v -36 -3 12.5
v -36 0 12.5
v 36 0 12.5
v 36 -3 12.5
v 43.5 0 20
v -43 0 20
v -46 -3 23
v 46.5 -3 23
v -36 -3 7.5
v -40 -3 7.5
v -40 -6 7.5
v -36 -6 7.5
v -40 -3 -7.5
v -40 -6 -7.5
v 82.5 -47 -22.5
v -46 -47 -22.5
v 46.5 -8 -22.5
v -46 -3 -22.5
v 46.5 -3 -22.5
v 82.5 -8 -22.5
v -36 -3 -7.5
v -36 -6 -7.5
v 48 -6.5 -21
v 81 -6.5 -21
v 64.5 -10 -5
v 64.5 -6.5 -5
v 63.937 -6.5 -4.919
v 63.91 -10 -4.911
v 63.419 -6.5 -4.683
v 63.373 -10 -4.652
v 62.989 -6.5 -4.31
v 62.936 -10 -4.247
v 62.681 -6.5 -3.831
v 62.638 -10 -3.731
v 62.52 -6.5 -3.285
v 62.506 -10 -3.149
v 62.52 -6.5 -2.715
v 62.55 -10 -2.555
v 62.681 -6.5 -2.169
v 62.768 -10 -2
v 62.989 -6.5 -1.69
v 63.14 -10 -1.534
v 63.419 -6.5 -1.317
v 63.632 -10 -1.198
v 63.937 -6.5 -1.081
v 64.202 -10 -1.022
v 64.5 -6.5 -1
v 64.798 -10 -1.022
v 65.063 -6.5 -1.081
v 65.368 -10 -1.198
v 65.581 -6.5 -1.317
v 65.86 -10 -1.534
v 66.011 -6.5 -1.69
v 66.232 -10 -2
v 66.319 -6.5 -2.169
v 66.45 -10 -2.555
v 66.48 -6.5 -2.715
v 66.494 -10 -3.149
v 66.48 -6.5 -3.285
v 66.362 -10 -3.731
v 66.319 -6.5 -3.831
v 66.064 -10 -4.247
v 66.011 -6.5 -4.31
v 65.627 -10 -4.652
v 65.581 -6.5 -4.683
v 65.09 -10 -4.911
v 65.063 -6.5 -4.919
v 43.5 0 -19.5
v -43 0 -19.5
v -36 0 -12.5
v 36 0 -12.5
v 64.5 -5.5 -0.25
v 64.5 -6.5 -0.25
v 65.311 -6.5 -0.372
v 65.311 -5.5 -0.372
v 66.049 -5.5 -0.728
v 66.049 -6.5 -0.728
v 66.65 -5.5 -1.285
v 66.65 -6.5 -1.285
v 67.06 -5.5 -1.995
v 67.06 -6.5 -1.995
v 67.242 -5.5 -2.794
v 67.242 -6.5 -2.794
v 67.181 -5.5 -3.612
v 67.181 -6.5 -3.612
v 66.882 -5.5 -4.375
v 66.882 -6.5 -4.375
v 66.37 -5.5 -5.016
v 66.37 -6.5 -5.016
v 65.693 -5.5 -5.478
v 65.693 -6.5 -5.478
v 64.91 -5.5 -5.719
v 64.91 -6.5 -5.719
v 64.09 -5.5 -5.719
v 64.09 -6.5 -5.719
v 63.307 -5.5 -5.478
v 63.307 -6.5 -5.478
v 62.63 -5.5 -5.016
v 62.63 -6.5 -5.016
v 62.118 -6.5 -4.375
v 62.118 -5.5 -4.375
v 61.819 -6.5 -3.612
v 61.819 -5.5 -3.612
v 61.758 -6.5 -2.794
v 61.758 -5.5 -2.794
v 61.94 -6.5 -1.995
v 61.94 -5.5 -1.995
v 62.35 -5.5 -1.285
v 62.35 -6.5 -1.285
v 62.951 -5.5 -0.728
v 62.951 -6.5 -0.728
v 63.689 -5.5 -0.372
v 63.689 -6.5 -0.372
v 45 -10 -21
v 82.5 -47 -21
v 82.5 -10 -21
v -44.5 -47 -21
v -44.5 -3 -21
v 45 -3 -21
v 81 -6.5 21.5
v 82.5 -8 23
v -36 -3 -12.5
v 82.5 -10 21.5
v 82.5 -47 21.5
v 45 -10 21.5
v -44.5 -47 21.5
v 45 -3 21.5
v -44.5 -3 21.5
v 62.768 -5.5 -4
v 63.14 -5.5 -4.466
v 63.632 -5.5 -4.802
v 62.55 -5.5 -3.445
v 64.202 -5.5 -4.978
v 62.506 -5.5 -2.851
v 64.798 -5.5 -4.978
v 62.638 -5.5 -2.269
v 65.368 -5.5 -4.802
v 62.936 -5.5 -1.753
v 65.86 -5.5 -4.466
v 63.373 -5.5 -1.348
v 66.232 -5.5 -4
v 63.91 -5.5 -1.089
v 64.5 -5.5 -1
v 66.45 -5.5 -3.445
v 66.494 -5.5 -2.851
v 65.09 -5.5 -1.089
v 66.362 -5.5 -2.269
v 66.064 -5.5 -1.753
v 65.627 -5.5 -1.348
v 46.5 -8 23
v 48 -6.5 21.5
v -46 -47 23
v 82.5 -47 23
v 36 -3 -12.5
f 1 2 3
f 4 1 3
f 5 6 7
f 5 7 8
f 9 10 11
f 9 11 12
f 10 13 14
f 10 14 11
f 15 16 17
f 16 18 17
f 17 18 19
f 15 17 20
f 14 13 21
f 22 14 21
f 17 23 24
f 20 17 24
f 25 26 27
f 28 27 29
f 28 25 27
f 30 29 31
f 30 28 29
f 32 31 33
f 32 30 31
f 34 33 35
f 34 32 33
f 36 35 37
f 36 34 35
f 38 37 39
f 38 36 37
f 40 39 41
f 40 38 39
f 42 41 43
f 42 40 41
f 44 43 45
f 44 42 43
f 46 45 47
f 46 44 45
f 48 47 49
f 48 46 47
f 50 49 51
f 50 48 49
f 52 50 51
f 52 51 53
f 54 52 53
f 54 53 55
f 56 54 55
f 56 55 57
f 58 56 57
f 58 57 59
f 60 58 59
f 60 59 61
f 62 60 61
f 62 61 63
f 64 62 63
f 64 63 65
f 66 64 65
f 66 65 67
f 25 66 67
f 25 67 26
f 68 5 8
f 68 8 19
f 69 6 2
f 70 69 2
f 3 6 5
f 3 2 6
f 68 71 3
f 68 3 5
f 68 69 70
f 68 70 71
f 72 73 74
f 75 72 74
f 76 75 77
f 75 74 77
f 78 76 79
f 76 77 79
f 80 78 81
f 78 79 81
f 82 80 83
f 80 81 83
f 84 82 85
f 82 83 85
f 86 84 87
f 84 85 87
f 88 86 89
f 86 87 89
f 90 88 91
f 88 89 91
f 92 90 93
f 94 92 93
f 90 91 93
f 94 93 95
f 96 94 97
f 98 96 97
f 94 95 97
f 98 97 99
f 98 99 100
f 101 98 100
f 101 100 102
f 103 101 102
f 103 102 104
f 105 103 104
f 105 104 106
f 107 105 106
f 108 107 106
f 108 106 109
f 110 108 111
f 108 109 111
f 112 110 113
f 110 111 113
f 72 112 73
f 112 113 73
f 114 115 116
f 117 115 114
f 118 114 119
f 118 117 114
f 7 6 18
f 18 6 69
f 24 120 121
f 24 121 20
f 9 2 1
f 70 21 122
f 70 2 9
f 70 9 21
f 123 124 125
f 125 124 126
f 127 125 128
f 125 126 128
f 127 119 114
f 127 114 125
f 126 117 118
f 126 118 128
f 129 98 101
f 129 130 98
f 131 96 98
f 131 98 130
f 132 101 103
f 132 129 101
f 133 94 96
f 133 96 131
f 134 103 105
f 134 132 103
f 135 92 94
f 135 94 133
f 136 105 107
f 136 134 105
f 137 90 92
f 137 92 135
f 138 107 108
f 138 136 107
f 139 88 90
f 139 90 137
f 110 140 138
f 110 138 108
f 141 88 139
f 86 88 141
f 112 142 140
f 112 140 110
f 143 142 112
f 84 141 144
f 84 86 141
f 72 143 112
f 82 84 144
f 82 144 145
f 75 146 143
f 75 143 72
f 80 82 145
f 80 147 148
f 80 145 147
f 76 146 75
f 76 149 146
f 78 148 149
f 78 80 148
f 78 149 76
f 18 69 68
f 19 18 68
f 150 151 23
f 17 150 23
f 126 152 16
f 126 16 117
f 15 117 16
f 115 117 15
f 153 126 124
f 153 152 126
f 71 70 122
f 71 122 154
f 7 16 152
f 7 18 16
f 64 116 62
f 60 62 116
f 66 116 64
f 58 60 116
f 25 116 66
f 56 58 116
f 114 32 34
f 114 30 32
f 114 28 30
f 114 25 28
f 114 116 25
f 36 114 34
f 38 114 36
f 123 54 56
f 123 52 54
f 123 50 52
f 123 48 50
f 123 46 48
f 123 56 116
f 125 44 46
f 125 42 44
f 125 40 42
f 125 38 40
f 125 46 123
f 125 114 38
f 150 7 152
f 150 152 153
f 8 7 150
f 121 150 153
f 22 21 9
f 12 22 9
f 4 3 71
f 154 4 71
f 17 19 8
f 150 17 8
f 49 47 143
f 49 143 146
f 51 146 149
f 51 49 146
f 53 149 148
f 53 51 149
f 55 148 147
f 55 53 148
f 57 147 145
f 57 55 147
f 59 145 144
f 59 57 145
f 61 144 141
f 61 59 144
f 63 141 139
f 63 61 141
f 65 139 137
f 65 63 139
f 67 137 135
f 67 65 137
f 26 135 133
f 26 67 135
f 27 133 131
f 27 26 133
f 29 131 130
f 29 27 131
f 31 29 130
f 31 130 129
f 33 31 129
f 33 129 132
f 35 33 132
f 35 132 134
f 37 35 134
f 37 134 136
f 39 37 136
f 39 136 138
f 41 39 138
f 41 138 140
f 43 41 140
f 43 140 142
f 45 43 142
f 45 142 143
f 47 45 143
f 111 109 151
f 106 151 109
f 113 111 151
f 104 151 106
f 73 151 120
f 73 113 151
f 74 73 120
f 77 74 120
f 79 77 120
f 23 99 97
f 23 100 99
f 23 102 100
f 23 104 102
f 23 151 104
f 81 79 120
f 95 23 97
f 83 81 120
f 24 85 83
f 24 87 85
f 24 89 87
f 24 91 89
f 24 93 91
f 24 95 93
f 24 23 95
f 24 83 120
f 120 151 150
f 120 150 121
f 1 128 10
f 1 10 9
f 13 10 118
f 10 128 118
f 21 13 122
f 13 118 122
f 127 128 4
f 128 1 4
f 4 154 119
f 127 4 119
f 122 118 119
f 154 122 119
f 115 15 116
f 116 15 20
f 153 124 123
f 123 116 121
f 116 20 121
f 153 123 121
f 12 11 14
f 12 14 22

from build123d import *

# Parameters (mm, degrees)
TOP_EDGE_OUTLINE_W  = 86.5
TOP_EDGE_OUTLINE_H  = 39.5
TOP_EDGE_DEPTH      = 3
TOP_EDGE_DRAFT      = 45
SKETCH13_W          = 72
SKETCH13_H          = 25
DISPLAY_HOLE_DEPTH  = 6
SKETCH14_W          = 92.5
SKETCH14_H          = 45.5
SKETCH14_W_2        = 89.5
SKETCH14_H_2        = 42.5
BOSS_EXTRUDE5_DEPTH = 5
SKETCH15_W          = 128.5
SKETCH15_H          = 45.5
SKETCH15_W_2        = 89.5
SKETCH15_H_2        = 42.5
BOSS_EXTRUDE6_DEPTH = 2
SKETCH16_W          = 128.5
SKETCH16_H          = 45.5
SKETCH16_W_2        = 125.5
SKETCH16_H_2        = 42.5
BOSS_EXTRUDE7_DEPTH = 37
LOFT2_OUTLINE_W     = 33
LOFT2_OUTLINE_H     = 42.5
LOFT2_DEPTH         = 1.5
LOFT2_DRAFT         = 45
SKETCH19_R          = 2.75
SKETCH19_R_2        = 2
BOSS_EXTRUDE8_DEPTH = 1
CUT_EXTRUDE3_START  = -11
SKETCH20_R          = 2
CUT_EXTRUDE3_DEPTH  = 11
SKETCH21_W          = 12
SKETCH21_H          = 8
CUT_EXTRUDE4_DEPTH  = 11
SKETCH22_W          = 4
SKETCH22_H          = 15
BOSS_EXTRUDE9_DEPTH = 3
SKETCH24_W          = 42.5
SKETCH24_H          = 37
CUT_EXTRUDE5_DEPTH  = 17


# Read off the part's stored shape, not the designer's step: Top Edge, Loft2
with BuildPart() as part:
    # Top Edge outline → Top Edge (with draft: the straight prism first)
    with BuildSketch(Plane(origin=(0, 0, 0), x_dir=(1, 0, 0), z_dir=(0, 1, 0))):
        with Locations((0.25, -0.25)):
            Rectangle(TOP_EDGE_OUTLINE_W, TOP_EDGE_OUTLINE_H)
    extrude(amount=-TOP_EDGE_DEPTH)
    # Top Edge: the draft: its side faces are tilted about the plane it starts from
    top_edge_sides = [part.faces().sort_by_distance(p)[0] for p in [
        (-43, -1.5, 0.25),
        (0.25, -1.5, 20),
        (43.5, -1.5, 0.25),
        (0.25, -1.5, -19.5),
    ]]
    draft(top_edge_sides, Plane(origin=(0, 0, 0), x_dir=(1, 0, 0), z_dir=(0, 1, 0)), TOP_EDGE_DRAFT)

    # Sketch13 → Display Hole (cut)
    with BuildSketch(Plane(origin=(0, 0, 0), x_dir=(1, 0, 0), z_dir=(0, 1, 0))):
        Rectangle(SKETCH13_W, SKETCH13_H)
    extrude(amount=-DISPLAY_HOLE_DEPTH, mode=Mode.SUBTRACT)

    # Sketch14 → Boss-Extrude5 (add)
    with BuildSketch(Plane.XZ.offset(3)):
        with Locations((0.25, 0.25)):
            Rectangle(SKETCH14_W, SKETCH14_H)
        with Locations((0.25, 0.25)):
            Rectangle(SKETCH14_W_2, SKETCH14_H_2, mode=Mode.SUBTRACT)
    extrude(amount=BOSS_EXTRUDE5_DEPTH)

    # Sketch15 → Boss-Extrude6 (add)
    with BuildSketch(Plane.XZ.offset(8)):
        with Locations((18.25, 0.25)):
            Rectangle(SKETCH15_W, SKETCH15_H)
        with Locations((0.25, 0.25)):
            Rectangle(SKETCH15_W_2, SKETCH15_H_2, mode=Mode.SUBTRACT)
    extrude(amount=BOSS_EXTRUDE6_DEPTH)

    # Sketch16 → Boss-Extrude7 (add)
    with BuildSketch(Plane.XZ.offset(10)):
        with Locations((18.25, 0.25)):
            Rectangle(SKETCH16_W, SKETCH16_H)
        with Locations((18.25, 0.25)):
            Rectangle(SKETCH16_W_2, SKETCH16_H_2, mode=Mode.SUBTRACT)
    extrude(amount=BOSS_EXTRUDE7_DEPTH)


with BuildPart() as loft2_tool:
    # Loft2 outline → Loft2 (with draft: the straight prism first)
    with BuildSketch(Plane(origin=(0, -6.5, 0), x_dir=(1, 0, 0), z_dir=(0, 1, 0))):
        with Locations((64.5, -0.25)):
            Rectangle(LOFT2_OUTLINE_W, LOFT2_OUTLINE_H)
    extrude(amount=-LOFT2_DEPTH)
    # Loft2: the draft: its side faces are tilted about the plane it starts from
    loft2_sides = [loft2_tool.faces().sort_by_distance(p)[0] for p in [
        (81, -7.25, 0.25),
        (64.5, -7.25, -21),
        (48, -7.25, 0.25),
        (64.5, -7.25, 21.5),
    ]]
    draft(loft2_sides, Plane(origin=(0, -6.5, 0), x_dir=(1, 0, 0), z_dir=(0, 1, 0)), LOFT2_DRAFT)


with BuildPart() as part_1:
    add(part.part)

    # Loft2: add loft2_tool
    add(loft2_tool.part)

    # Sketch19 → Boss-Extrude8 (add)
    with BuildSketch(Plane(origin=(0, -6.5, 0), x_dir=(1, 0, 0), z_dir=(0, 1, 0))):
        with Locations(Location((64.5, 3, 0), (0, 0, 270))):
            Circle(SKETCH19_R)
        with Locations(Location((64.5, 3, 0), (0, 0, 270))):
            Circle(SKETCH19_R_2, mode=Mode.SUBTRACT)
    extrude(amount=BOSS_EXTRUDE8_DEPTH)

    # Sketch20 → Cut-Extrude3 (cut)
    with BuildSketch(Plane(origin=(0, -6.5, 0), x_dir=(1, 0, 0), z_dir=(0, 1, 0)).offset(CUT_EXTRUDE3_START)):
        with Locations(Location((64.5, 3, 0), (0, 0, 90))):
            Circle(SKETCH20_R)
    extrude(amount=CUT_EXTRUDE3_DEPTH, mode=Mode.SUBTRACT)

    # Sketch21 → Cut-Extrude4 (cut)
    with BuildSketch(Plane(origin=(82.5, 0, 0), x_dir=(0, 0, -1), z_dir=(1, 0, 0))):
        with Locations((0, -43)):
            Rectangle(SKETCH21_W, SKETCH21_H)
    extrude(amount=-CUT_EXTRUDE4_DEPTH, mode=Mode.SUBTRACT)

    # Sketch22 → Boss-Extrude9 (add)
    with BuildSketch(Plane.XZ.offset(3)):
        with Locations((-38, 0)):
            Rectangle(SKETCH22_W, SKETCH22_H)
    extrude(amount=BOSS_EXTRUDE9_DEPTH)

    # Sketch24 → Cut-Extrude5 (cut)
    with BuildSketch(Plane.ZY.offset(-81)):
        with Locations((0.25, -28.5)):
            Rectangle(SKETCH24_W, SKETCH24_H)
    extrude(amount=-CUT_EXTRUDE5_DEPTH, mode=Mode.SUBTRACT)


solid = part_1.part
